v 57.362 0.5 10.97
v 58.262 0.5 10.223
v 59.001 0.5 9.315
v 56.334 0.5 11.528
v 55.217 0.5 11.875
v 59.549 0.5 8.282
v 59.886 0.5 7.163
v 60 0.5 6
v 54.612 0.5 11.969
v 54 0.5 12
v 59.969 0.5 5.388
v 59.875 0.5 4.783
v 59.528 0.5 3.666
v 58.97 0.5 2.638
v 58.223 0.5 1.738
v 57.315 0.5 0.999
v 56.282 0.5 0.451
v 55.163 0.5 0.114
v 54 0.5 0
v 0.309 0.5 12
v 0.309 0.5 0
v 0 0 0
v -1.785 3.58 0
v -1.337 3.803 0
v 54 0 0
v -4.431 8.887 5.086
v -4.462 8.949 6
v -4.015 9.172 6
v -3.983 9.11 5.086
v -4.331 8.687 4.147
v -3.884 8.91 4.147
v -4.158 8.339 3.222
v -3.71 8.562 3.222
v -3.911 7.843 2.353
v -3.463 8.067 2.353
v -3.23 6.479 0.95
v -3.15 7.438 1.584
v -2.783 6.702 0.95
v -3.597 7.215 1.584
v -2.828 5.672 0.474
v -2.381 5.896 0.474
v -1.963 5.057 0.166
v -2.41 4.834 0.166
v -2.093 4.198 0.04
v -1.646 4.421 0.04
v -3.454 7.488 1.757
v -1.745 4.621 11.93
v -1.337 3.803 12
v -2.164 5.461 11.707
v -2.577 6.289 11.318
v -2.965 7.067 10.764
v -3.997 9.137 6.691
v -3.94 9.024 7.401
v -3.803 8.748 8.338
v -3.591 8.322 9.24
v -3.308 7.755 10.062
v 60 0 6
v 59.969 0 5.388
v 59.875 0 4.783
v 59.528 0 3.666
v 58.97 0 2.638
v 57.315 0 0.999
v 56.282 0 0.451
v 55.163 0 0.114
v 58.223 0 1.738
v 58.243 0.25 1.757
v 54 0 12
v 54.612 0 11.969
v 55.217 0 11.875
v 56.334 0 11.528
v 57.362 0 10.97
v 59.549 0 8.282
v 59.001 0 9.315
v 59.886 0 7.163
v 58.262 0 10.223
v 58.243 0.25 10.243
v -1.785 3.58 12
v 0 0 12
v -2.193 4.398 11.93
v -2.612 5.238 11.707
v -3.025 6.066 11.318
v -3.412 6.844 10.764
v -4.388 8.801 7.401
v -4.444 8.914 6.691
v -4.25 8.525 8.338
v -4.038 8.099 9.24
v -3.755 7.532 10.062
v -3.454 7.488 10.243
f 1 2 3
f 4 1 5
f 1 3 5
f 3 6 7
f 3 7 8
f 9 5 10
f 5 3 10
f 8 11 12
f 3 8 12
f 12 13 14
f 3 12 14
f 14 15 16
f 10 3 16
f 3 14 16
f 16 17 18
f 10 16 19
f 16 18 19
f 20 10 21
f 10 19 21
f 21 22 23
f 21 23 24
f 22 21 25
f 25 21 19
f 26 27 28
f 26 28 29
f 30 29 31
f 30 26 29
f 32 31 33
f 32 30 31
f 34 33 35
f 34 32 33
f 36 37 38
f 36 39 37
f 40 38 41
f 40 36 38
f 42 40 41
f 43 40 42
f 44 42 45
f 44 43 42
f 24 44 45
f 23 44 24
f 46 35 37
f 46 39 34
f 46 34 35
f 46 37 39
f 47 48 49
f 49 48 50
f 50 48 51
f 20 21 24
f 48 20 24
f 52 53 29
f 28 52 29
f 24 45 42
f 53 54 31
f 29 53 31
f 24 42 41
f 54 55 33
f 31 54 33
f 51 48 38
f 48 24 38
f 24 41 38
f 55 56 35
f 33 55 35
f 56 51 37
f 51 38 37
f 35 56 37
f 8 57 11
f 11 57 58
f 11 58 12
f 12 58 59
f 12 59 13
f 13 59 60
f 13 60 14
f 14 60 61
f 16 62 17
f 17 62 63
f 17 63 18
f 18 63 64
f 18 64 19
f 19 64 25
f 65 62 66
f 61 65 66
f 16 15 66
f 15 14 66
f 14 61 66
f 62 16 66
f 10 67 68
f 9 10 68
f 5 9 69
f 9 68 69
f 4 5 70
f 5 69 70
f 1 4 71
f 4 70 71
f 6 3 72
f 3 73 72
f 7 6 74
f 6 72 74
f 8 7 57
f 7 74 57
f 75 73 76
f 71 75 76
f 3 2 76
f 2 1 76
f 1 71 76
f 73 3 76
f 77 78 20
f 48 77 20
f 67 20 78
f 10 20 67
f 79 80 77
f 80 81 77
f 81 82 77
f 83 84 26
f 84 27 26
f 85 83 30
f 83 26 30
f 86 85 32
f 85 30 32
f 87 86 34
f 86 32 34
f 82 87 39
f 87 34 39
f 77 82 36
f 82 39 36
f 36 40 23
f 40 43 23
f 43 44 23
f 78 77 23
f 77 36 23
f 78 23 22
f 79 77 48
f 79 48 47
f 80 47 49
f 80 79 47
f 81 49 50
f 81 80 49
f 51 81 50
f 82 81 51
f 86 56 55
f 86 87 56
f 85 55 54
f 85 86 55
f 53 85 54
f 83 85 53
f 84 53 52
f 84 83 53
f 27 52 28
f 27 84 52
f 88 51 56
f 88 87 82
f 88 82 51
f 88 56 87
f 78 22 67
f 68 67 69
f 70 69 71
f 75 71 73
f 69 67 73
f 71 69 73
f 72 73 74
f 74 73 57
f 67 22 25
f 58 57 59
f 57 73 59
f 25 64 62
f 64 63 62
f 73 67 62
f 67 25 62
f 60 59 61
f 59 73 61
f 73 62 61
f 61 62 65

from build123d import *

# Parameters (mm, degrees)
RESSALTO_EXTRUS_O1_DEPTH = 12
FILETE1_START            = -1
FILETE1_DEPTH            = 5.566394674
FILETE1_2_DEPTH          = 0.5


with BuildPart() as part:
    # Esboço1 → Ressalto-extrusão1 (new body)
    with BuildSketch(Plane.XY):
        Polygon((0, 0), (60, 0), (60, 0.5), (0.309409388, 0.5), (-4.01451095, 9.172442523), (-4.461978131, 8.949343616), align=None)
    extrude(amount=RESSALTO_EXTRUS_O1_DEPTH)

    # Filete1: read off the stored shape, not the designer's step
    # Filete1 outline → Filete1 (cut)
    with BuildSketch(Plane(origin=(0, 0, 0), x_dir=(1, 0, 0), z_dir=(0, 1, 0)).offset(FILETE1_START)):
        with BuildLine():
            Line((60, -12), (60, -6))
            add(Edge.make_bspline(
                [(54, -12), (60, -12), (60, -6)],
                knots=[0, 0, 0, 1, 1, 1], degree=2, weights=[1, 0.707106781, 1]))
            Line((54, -12), (60, -12))
        make_face()
        with BuildLine():
            add(Edge.make_bspline(
                [(60, -6), (60, 0), (54, 0)],
                knots=[0, 0, 0, 1, 1, 1], degree=2, weights=[1, 0.707106781, 1]))
            Line((60, -6), (60, 0))
            Line((60, 0), (54, 0))
        make_face()
    extrude(amount=FILETE1_DEPTH, mode=Mode.SUBTRACT)

    # Filete1 2 outline → Filete1 2 (cut)
    with BuildSketch(Plane(origin=(0, 0, 0), x_dir=(0.44619781310978035, -0.8949343616020392, 0), z_dir=(0.8949343616020393, 0.44619781310977996, 0))):
        with BuildLine():
            Line((-10, 0), (-10, -6))
            add(Edge.make_bspline(
                [(-10, -6), (-10, 0), (-4, 0)],
                knots=[0, 0, 0, 1, 1, 1], degree=2, weights=[1, 0.707106781, 1]))
            Line((-4, 0), (-10, 0))
        make_face()
        with BuildLine():
            add(Edge.make_bspline(
                [(-4, -12), (-10, -12), (-10, -6)],
                knots=[0, 0, 0, 1, 1, 1], degree=2, weights=[1, 0.707106781, 1]))
            Line((-10, -6), (-10, -12))
            Line((-10, -12), (-4, -12))
        make_face()
    extrude(amount=FILETE1_2_DEPTH, mode=Mode.SUBTRACT)


solid = part.part
